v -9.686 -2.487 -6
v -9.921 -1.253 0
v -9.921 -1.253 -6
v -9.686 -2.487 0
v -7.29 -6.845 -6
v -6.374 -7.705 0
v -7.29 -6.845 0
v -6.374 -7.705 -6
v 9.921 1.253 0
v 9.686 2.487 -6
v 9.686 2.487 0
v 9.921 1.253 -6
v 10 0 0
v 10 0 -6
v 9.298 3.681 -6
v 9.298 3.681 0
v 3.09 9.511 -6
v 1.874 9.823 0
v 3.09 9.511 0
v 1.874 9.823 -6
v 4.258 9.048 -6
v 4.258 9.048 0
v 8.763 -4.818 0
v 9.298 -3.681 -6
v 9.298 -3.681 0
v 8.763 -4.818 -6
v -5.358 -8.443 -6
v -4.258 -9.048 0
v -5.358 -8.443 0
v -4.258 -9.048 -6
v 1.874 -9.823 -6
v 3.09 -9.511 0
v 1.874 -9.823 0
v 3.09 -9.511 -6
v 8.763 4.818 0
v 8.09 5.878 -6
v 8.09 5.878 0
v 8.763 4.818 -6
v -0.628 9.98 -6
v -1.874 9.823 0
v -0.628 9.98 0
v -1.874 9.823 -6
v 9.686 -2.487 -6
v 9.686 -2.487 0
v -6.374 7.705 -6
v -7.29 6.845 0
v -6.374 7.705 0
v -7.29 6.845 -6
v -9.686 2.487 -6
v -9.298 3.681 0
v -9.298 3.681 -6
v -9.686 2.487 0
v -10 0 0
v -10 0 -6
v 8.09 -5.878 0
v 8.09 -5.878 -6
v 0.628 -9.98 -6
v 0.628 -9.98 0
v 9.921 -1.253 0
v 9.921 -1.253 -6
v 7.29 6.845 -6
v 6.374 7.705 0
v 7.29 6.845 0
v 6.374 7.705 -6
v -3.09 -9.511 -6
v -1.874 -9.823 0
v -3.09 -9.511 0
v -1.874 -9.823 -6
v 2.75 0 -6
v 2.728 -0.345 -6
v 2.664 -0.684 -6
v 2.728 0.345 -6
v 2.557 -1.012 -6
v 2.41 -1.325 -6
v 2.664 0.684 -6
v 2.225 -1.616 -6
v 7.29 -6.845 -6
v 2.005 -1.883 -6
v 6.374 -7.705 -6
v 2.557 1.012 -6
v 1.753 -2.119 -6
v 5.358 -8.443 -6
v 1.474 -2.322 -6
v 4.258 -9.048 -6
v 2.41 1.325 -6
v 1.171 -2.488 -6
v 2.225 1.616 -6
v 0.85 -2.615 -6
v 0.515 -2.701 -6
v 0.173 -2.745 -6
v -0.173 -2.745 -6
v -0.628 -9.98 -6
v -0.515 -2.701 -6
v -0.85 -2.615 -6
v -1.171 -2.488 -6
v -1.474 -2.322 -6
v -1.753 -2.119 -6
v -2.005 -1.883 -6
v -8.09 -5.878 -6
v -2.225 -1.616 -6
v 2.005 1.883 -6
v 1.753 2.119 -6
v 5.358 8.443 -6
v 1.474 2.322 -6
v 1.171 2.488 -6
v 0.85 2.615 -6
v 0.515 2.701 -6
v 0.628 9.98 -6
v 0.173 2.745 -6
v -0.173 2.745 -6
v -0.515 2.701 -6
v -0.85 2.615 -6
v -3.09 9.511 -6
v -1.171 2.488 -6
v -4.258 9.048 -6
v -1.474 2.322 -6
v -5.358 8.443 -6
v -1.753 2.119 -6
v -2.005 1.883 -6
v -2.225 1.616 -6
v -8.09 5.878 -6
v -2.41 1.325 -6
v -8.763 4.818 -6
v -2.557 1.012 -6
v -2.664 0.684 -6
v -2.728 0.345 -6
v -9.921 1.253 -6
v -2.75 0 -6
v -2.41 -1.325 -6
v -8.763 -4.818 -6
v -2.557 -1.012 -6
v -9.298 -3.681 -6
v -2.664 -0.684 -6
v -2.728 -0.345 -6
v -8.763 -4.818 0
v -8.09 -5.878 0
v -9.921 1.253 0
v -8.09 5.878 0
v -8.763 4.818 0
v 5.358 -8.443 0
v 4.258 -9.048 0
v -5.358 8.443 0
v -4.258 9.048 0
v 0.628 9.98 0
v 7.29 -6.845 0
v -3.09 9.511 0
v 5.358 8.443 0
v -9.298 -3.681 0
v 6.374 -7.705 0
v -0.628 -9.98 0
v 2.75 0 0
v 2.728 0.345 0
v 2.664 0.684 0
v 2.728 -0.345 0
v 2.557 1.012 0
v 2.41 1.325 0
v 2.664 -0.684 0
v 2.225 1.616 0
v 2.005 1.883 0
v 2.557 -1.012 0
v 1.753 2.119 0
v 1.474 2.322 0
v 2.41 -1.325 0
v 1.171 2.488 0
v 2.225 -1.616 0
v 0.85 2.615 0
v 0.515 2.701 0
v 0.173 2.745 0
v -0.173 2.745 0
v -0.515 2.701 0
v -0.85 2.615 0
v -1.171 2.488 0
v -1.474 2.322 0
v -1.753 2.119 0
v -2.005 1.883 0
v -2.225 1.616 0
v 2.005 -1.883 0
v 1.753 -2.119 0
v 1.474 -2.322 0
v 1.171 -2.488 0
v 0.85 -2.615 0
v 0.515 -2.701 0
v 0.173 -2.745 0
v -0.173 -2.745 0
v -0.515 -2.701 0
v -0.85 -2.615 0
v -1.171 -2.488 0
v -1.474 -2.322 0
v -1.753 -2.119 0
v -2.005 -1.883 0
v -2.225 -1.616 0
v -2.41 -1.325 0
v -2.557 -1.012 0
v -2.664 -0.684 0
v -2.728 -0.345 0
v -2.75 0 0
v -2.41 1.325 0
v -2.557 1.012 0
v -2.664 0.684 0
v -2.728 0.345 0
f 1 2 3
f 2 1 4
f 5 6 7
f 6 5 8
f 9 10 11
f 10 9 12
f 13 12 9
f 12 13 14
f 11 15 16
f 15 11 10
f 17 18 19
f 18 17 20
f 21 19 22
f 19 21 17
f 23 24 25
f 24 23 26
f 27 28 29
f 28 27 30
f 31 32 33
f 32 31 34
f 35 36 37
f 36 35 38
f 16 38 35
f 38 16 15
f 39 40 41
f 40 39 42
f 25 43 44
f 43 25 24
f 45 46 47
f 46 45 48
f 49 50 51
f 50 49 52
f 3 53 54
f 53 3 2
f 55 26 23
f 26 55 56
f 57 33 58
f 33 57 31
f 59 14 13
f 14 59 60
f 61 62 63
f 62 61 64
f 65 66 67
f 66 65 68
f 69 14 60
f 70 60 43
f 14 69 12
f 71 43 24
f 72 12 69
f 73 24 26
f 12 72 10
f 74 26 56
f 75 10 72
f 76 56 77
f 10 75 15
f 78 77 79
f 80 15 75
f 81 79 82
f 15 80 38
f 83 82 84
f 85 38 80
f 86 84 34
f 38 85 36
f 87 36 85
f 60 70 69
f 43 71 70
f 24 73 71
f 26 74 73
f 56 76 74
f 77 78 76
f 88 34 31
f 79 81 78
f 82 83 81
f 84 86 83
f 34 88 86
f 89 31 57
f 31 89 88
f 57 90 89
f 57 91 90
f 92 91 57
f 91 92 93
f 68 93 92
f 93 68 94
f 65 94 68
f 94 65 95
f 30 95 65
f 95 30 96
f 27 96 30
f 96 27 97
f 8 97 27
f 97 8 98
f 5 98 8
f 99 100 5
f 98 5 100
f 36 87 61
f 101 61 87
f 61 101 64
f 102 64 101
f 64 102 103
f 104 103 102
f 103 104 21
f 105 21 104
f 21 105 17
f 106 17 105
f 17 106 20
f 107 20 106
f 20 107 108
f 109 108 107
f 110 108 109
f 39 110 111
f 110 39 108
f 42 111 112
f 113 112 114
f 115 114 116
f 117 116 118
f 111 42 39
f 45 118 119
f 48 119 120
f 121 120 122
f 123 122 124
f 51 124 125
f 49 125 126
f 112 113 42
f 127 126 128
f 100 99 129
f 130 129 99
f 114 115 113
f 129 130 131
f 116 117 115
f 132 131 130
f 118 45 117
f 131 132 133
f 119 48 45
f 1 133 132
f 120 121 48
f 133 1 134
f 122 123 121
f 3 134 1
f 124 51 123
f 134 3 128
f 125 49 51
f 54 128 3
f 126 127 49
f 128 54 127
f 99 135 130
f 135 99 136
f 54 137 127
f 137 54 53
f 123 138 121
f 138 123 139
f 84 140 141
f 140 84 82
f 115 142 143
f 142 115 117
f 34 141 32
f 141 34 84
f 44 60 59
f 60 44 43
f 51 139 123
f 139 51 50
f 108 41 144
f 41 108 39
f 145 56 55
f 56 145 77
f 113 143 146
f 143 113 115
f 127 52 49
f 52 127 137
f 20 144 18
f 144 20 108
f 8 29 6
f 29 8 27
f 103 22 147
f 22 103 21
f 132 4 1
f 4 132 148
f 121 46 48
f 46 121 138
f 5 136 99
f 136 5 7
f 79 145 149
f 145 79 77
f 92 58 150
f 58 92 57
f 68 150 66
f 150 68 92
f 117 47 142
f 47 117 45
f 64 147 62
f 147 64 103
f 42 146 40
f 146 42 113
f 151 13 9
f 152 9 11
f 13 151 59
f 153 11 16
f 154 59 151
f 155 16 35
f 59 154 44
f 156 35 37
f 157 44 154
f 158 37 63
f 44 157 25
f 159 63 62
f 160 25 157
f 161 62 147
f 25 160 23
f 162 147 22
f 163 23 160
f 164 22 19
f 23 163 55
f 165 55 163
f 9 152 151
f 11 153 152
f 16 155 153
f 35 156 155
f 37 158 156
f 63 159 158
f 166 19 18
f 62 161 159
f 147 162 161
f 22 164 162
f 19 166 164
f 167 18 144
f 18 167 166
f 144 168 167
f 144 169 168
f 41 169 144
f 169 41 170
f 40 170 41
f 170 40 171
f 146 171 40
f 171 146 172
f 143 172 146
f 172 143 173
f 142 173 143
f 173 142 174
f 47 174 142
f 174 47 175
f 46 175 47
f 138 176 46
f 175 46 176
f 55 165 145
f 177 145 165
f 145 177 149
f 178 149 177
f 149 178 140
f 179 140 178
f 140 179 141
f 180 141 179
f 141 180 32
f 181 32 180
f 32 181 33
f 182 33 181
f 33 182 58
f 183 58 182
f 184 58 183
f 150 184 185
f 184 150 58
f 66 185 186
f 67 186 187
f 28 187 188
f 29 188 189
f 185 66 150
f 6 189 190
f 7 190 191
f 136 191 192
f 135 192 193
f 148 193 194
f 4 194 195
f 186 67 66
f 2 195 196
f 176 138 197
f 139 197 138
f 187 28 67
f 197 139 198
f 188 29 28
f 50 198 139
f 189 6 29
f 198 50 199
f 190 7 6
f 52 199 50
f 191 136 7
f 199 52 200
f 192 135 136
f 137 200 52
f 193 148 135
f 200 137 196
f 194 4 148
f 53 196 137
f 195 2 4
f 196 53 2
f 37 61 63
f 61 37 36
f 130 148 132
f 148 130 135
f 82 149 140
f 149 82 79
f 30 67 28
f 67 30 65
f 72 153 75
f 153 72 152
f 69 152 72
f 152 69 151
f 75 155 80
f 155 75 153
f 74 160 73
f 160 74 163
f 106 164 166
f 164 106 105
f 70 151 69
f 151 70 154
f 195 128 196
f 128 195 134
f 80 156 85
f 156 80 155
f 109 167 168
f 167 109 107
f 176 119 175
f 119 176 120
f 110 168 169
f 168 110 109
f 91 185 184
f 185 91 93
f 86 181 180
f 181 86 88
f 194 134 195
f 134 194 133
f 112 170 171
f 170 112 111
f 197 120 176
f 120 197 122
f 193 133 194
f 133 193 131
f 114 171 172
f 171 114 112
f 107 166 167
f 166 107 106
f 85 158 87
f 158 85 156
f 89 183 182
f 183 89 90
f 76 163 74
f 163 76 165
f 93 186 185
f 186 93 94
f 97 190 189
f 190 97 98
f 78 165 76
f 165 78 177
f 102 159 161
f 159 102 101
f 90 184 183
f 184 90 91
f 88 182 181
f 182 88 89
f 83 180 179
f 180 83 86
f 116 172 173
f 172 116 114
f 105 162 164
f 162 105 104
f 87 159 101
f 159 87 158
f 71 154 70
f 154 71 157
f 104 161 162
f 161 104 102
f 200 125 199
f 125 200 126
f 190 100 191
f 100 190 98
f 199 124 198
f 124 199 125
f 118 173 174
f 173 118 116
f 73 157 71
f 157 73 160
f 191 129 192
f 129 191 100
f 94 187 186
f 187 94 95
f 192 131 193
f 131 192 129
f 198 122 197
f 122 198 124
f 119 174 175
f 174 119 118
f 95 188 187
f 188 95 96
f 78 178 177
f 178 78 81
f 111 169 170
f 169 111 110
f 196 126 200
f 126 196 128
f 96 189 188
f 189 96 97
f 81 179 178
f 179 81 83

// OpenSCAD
$fn = 50;


difference() {
	union() {
		translate(v = [0, 0, -6.0000000000]) {
			cylinder(h = 6, r = 10.0000000000);
		}
		cylinder(h = 0, r = 19.0000000000);
	}
	union() {
		#translate(v = [0, 0, -6]) {
			cylinder(h = 6, r = 2.7500000000);
		}
	}
}
